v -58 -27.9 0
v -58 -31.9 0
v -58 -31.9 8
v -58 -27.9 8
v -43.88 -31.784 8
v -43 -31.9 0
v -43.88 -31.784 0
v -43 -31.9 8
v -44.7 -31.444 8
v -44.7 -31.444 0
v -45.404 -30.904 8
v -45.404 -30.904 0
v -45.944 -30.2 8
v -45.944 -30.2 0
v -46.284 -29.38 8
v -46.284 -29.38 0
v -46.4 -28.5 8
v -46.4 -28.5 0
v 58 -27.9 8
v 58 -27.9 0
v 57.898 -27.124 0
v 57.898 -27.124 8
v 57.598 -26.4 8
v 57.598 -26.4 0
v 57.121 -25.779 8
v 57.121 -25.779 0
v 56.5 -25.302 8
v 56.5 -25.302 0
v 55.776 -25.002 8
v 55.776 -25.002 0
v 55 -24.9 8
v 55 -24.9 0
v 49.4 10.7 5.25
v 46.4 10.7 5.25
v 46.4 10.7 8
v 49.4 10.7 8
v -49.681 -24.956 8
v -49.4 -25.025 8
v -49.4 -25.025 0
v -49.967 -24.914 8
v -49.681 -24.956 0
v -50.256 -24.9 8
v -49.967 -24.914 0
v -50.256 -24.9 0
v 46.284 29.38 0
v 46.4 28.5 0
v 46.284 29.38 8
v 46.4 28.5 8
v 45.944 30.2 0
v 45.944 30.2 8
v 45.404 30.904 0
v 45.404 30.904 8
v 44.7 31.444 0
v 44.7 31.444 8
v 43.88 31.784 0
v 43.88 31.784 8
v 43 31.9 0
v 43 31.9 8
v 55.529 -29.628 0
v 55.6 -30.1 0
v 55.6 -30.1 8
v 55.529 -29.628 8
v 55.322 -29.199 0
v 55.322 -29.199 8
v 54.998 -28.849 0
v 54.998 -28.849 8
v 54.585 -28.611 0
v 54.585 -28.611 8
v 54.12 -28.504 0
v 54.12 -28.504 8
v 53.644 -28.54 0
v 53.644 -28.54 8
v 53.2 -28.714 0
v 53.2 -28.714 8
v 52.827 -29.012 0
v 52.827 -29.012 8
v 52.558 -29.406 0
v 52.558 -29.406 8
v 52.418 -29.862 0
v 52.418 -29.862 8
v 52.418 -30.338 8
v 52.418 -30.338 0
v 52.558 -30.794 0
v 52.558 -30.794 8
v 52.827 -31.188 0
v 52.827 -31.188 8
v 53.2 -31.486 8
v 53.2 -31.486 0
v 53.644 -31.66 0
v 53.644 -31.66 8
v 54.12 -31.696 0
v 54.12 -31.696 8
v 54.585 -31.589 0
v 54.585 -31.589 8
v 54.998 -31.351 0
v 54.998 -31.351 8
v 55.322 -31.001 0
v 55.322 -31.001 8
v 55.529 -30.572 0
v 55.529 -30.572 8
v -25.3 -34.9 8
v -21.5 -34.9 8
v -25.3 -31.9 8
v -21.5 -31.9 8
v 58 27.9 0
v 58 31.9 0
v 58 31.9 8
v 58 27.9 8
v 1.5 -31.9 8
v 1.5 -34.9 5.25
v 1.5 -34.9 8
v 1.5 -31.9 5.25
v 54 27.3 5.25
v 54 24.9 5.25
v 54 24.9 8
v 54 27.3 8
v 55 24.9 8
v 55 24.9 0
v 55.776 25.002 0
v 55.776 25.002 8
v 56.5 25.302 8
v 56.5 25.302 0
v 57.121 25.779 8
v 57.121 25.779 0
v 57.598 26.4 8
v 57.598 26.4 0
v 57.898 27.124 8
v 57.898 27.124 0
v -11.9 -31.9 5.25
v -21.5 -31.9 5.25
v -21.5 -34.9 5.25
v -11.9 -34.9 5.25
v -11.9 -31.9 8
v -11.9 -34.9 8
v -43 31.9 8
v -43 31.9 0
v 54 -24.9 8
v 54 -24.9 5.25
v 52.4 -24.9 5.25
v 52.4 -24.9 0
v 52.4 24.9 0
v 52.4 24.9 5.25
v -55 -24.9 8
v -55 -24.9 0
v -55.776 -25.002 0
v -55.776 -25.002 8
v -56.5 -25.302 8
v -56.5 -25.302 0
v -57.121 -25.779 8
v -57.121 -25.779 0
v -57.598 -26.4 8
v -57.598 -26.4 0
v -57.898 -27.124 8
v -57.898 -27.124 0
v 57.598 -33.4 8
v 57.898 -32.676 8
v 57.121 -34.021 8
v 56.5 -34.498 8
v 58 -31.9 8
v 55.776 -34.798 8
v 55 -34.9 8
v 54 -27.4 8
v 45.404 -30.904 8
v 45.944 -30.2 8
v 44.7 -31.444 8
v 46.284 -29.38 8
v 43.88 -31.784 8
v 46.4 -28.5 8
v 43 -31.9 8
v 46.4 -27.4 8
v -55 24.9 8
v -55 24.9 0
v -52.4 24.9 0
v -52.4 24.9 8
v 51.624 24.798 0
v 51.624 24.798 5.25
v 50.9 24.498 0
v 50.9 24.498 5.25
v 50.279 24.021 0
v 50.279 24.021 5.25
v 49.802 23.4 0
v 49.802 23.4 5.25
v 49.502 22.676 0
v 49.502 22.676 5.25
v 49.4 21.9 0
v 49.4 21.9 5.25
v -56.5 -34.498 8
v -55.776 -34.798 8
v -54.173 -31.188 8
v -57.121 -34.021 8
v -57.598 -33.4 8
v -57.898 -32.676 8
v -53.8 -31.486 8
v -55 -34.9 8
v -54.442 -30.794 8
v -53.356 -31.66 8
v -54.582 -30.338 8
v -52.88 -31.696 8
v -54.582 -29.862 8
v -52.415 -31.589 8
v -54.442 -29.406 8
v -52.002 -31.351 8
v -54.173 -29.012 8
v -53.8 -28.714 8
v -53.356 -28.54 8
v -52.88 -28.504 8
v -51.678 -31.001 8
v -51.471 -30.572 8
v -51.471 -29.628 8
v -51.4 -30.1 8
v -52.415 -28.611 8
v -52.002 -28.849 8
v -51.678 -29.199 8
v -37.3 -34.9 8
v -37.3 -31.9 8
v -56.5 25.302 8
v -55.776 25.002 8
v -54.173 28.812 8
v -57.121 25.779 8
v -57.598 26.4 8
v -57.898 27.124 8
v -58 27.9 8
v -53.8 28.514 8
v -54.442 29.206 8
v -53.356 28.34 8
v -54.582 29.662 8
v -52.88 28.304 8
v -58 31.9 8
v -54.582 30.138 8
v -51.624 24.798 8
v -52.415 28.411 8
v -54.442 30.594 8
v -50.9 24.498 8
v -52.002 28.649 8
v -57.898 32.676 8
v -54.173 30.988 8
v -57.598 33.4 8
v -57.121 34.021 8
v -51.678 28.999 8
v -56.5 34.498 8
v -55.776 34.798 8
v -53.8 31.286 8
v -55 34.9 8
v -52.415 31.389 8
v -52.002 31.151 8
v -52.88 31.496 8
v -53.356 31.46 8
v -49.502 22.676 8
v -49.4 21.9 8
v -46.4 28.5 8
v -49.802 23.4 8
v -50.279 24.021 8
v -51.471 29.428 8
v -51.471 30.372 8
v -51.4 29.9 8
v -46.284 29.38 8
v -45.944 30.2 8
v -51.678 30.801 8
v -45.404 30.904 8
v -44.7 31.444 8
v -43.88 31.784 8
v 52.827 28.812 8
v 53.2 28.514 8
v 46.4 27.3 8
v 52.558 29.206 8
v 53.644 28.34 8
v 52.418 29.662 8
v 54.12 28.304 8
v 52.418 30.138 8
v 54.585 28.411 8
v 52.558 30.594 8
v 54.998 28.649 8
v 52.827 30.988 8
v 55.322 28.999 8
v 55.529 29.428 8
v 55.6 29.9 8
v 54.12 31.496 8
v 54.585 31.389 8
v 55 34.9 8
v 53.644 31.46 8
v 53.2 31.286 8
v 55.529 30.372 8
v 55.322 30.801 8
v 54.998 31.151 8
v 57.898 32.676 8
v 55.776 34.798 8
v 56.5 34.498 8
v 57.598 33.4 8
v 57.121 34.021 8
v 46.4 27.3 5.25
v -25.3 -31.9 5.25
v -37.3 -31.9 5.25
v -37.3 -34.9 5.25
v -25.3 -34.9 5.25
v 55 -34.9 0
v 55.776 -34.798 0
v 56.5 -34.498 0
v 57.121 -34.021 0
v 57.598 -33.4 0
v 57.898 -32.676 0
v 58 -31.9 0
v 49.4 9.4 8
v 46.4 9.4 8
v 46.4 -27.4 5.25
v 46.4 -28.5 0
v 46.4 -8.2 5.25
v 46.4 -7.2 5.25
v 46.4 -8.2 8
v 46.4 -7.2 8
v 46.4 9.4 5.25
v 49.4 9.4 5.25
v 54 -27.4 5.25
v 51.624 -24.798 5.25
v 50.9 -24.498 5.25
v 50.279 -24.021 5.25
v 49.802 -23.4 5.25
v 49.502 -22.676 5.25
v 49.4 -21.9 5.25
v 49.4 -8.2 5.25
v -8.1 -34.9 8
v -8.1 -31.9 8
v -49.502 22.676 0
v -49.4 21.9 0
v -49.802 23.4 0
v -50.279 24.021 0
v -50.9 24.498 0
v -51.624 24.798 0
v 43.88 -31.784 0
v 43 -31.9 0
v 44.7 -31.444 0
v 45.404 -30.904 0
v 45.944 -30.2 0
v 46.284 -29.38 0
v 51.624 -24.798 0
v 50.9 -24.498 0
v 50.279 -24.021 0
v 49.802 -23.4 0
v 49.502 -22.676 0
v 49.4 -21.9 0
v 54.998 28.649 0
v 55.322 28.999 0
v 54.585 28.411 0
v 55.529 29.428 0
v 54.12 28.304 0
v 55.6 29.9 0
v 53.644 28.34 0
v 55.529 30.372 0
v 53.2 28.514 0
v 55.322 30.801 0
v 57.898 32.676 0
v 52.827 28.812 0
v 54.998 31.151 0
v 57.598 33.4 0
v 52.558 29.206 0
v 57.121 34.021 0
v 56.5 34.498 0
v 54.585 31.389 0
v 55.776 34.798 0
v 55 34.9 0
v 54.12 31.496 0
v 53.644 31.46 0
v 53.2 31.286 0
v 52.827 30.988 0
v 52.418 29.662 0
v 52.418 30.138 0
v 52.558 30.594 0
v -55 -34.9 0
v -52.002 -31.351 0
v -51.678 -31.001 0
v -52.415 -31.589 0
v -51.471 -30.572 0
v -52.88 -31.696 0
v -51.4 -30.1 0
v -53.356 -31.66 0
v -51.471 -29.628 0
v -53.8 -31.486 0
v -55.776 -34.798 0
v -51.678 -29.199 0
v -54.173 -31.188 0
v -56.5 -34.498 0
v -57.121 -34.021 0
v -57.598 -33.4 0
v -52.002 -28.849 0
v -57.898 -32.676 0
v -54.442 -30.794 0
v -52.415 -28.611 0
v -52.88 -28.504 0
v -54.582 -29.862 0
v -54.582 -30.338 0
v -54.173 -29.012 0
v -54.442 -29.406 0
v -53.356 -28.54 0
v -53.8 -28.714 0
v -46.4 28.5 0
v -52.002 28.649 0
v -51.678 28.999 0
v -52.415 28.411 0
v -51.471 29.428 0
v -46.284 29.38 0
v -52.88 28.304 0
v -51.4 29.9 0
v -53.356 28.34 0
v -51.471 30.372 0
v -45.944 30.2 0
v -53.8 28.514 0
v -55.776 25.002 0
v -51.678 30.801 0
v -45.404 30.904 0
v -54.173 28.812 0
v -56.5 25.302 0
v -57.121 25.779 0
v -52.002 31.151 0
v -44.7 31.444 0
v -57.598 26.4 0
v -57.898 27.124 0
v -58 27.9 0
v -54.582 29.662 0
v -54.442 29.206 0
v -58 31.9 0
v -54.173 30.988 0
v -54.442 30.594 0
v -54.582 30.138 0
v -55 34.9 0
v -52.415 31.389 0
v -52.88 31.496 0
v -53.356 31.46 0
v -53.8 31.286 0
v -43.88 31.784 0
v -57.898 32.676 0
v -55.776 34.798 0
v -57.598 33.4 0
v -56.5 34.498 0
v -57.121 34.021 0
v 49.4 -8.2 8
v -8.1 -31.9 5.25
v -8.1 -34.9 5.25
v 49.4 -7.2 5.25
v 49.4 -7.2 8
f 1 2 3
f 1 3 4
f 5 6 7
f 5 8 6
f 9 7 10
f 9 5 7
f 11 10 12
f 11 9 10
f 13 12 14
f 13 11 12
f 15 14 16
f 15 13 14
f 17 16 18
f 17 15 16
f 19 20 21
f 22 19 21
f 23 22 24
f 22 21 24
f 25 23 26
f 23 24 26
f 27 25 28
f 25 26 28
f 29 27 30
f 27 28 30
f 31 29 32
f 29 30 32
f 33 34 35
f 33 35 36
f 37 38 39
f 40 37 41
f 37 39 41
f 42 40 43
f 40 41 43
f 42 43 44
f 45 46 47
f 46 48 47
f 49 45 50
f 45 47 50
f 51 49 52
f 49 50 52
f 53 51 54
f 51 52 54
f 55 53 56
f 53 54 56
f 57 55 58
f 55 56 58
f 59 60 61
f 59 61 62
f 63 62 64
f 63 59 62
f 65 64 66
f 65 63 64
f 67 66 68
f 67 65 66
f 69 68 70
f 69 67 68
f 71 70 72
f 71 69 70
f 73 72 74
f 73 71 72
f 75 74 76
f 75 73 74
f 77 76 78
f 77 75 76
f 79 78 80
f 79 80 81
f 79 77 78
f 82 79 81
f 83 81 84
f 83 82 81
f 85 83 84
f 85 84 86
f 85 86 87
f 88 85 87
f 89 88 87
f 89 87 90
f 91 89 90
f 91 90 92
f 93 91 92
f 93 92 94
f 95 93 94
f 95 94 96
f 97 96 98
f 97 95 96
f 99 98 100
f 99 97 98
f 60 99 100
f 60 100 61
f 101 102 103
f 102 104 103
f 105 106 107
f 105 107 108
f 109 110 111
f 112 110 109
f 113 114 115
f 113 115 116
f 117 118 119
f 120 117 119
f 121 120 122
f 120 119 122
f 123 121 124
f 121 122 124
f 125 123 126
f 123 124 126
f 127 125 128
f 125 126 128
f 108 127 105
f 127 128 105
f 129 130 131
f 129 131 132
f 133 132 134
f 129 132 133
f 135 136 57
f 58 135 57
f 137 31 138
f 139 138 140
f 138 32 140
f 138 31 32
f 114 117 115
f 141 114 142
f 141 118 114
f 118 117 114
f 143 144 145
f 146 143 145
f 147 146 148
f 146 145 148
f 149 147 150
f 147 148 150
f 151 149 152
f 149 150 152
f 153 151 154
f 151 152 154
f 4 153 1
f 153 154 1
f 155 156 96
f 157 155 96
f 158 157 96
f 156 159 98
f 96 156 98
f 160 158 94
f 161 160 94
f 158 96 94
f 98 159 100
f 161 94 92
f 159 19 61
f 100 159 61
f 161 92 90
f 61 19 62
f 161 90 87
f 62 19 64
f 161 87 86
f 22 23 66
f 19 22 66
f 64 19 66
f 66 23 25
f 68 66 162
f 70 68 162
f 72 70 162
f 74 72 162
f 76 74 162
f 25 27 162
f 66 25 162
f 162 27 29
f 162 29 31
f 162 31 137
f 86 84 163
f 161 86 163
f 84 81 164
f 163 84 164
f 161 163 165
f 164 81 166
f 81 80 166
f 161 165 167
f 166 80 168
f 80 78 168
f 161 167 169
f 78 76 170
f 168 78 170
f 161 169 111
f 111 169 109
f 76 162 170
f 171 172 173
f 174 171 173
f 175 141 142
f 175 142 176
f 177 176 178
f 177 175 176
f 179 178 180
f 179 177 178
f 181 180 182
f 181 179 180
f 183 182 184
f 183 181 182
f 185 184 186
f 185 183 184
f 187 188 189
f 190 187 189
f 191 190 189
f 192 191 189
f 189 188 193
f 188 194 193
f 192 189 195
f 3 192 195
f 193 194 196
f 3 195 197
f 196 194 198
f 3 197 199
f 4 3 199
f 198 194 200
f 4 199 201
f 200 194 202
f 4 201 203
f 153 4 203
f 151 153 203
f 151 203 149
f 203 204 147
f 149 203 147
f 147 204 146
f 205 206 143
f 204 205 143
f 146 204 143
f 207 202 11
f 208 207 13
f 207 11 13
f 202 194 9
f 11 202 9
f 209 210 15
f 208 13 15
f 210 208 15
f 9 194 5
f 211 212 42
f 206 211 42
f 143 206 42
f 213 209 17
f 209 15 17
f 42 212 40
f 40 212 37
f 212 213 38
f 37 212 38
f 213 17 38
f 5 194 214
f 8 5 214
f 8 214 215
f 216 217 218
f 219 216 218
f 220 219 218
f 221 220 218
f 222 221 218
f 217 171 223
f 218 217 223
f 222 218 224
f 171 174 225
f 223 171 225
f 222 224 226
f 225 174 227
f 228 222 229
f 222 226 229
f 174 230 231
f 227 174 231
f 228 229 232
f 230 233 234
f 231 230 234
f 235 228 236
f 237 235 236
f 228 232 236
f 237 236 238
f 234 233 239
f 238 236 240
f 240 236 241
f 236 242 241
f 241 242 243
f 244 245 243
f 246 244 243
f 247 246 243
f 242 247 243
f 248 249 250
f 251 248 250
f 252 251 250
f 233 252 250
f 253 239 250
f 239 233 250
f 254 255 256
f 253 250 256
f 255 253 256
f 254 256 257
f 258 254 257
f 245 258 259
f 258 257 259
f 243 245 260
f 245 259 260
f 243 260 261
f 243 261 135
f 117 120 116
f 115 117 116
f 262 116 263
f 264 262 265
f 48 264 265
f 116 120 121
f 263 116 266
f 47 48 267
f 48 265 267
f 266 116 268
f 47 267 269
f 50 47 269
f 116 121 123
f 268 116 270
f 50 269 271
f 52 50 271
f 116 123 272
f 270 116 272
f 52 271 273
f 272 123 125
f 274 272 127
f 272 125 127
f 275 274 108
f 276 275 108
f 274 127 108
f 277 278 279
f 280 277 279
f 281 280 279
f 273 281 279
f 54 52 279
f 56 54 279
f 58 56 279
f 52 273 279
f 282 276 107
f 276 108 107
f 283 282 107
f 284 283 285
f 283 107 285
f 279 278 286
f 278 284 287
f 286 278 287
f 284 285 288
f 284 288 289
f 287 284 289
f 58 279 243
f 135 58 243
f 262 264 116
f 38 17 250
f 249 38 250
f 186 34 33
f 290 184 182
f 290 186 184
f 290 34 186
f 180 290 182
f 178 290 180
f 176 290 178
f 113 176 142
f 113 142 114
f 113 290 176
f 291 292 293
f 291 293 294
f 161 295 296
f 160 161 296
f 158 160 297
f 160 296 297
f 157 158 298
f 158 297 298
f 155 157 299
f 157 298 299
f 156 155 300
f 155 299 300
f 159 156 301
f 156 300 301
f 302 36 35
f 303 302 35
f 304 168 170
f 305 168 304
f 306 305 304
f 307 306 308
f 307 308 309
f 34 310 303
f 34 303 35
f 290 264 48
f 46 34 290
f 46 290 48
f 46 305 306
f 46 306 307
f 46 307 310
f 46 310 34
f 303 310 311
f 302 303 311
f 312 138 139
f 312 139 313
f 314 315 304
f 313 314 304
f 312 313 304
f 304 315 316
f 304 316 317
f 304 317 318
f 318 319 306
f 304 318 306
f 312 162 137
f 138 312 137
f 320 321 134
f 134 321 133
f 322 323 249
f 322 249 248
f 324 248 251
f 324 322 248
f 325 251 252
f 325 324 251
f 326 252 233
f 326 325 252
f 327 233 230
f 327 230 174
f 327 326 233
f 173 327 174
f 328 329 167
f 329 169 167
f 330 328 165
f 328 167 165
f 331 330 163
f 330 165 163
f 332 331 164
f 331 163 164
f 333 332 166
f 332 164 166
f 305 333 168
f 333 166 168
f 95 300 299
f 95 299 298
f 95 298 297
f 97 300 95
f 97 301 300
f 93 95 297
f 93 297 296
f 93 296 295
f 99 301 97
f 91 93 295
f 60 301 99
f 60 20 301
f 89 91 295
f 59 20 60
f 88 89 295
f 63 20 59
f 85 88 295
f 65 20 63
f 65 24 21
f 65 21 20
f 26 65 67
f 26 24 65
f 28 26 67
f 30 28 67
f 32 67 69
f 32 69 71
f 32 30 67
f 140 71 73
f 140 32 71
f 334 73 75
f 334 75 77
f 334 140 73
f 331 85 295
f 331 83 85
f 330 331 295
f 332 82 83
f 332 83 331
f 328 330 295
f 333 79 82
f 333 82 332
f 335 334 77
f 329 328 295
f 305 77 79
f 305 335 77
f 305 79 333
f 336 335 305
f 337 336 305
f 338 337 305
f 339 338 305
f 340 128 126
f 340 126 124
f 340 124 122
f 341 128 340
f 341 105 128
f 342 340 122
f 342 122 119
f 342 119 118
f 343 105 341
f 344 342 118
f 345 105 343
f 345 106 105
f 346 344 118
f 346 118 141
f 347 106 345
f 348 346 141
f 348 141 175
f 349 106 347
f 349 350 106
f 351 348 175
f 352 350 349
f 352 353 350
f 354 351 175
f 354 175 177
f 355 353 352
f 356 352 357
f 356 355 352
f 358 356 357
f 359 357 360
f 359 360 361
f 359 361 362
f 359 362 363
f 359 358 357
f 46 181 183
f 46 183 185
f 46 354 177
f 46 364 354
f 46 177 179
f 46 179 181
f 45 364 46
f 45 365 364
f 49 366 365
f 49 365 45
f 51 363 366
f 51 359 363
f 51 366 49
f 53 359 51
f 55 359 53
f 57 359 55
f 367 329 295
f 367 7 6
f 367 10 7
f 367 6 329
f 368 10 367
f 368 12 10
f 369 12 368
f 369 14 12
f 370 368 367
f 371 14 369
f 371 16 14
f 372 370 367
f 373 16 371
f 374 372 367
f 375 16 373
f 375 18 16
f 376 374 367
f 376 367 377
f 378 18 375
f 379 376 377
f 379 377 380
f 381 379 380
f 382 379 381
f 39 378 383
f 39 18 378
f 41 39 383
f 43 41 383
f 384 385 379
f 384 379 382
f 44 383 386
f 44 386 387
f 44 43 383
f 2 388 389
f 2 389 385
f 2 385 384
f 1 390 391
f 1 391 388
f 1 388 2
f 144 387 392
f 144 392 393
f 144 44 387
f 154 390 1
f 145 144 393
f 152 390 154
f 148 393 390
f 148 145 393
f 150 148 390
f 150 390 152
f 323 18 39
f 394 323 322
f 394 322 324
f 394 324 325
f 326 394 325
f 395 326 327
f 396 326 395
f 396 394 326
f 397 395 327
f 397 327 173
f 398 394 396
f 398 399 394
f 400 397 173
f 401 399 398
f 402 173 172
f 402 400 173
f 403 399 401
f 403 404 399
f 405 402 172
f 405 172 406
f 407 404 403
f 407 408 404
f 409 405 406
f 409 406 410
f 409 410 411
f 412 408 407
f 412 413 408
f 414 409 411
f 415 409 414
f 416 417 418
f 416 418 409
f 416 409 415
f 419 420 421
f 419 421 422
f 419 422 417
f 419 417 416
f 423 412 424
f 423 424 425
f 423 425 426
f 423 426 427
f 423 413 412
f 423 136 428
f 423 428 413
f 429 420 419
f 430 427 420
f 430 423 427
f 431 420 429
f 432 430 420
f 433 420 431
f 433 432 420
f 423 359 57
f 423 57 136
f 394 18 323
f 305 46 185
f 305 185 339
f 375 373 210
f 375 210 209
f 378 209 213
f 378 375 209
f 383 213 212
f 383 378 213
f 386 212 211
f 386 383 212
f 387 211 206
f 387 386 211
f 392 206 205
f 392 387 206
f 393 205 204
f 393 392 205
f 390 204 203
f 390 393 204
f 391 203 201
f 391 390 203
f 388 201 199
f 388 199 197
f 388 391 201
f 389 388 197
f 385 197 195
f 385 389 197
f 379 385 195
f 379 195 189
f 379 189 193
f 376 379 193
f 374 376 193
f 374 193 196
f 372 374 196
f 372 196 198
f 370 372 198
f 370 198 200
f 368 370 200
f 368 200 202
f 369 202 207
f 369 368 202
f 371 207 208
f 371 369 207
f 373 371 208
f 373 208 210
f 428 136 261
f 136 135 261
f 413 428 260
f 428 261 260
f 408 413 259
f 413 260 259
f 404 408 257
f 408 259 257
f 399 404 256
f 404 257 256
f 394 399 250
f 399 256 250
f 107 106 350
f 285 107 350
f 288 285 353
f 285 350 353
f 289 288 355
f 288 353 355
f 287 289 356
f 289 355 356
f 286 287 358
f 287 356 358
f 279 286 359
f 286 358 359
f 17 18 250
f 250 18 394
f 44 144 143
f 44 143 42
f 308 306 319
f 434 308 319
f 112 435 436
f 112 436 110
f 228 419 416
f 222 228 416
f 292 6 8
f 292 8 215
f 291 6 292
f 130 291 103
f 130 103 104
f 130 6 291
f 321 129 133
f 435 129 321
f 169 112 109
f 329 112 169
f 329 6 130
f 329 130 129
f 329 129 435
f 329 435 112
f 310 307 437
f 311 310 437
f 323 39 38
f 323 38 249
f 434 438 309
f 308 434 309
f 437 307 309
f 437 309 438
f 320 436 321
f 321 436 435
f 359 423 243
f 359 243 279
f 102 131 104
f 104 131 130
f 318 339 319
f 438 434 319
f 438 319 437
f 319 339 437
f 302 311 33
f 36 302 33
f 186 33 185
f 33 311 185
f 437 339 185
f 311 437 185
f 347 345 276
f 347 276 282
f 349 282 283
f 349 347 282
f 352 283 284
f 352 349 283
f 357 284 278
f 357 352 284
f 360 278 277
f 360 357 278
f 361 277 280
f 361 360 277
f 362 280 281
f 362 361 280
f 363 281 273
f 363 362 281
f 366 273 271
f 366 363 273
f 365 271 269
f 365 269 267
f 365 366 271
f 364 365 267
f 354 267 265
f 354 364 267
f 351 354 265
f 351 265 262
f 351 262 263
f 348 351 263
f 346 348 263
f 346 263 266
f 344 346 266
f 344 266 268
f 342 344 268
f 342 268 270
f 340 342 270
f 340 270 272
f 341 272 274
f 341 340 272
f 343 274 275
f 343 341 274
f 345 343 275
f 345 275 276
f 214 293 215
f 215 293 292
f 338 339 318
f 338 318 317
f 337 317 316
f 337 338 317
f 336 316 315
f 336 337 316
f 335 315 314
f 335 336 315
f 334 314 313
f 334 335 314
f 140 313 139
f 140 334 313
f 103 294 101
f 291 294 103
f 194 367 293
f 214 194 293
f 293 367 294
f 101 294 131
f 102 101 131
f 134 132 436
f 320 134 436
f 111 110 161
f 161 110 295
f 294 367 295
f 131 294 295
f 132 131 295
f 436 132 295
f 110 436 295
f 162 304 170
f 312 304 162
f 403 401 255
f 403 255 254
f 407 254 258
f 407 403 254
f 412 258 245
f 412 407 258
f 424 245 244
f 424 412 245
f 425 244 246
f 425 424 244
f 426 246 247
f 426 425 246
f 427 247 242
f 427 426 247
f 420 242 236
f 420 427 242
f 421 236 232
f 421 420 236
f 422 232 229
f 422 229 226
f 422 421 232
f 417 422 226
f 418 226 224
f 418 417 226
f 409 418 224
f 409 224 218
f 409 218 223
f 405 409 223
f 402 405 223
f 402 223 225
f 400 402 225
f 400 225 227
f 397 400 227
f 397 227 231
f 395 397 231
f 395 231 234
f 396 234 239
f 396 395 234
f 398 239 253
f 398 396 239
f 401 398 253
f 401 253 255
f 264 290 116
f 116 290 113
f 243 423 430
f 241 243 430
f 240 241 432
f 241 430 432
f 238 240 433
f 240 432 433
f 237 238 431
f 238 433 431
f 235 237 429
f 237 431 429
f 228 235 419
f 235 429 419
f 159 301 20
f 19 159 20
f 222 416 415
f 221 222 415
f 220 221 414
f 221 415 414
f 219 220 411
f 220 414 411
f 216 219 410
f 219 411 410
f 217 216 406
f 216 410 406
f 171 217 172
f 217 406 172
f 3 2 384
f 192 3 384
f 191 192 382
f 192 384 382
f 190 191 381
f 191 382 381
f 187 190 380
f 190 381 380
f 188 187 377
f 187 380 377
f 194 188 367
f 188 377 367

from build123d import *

# Parameters (mm, degrees)
FRAMEOUTSIDE_W                    = 98.8
FRAMEOUTSIDE_H                    = 69.8
FRAME_HEIGHT_8_DEPTH              = 8
OUTSIDE_R6P4_R                    = 6.4
FRAMEINSIDE_W                     = 92.8
FRAMEINSIDE_H                     = 63.8
OPEN_THROUGH_FRAME_DEPTH          = 8.3
INSIDE_R3P4_R                     = 3.4
FOUR_CORNER_EARS_R2_PITCH110X80_R = 1.6
INTEGRAL_EARS_4X3P2_DEPTH         = 8
OPEN_TOP_CABLE_RELIEFS_START      = 5.25
PLUG_CLEARANCE_PROFILES_W         = 12
PLUG_CLEARANCE_PROFILES_H         = 8
PLUG_CLEARANCE_PROFILES_W_2       = 9.6
PLUG_CLEARANCE_PROFILES_W_3       = 8.5
PLUG_CLEARANCE_PROFILES_H_2       = 19.2
PLUG_CLEARANCE_PROFILES_H_3       = 16.6
OPEN_TOP_CABLE_RELIEFS_DEPTH      = 3.25
FILLET_1_R                        = 3


with BuildPart() as part:
    # FrameOutside → Frame_Height_8 (new body)
    with BuildSketch(Plane.XY):
        Rectangle(FRAMEOUTSIDE_W, FRAMEOUTSIDE_H)
    extrude(amount=FRAME_HEIGHT_8_DEPTH)

    # Outside_R6p4
    outside_r6p4_edges = [part.edges().sort_by_distance(p)[0] for p in [
        (49.4, -34.9, 4),
        (-49.4, -34.9, 4),
        (-49.4, 34.9, 4),
        (49.4, 34.9, 4),
    ]]
    fillet(outside_r6p4_edges, radius=OUTSIDE_R6P4_R)

    # FrameInside → Open_Through_Frame (cut)
    with BuildSketch(Plane.XY):
        Rectangle(FRAMEINSIDE_W, FRAMEINSIDE_H)
    extrude(amount=OPEN_THROUGH_FRAME_DEPTH, mode=Mode.SUBTRACT)

    # Inside_R3p4
    inside_r3p4_edges = [part.edges().sort_by_distance(p)[0] for p in [
        (46.4, -31.9, 4),
        (46.4, 31.9, 4),
        (-46.4, 31.9, 4),
        (-46.4, -31.9, 4),
    ]]
    fillet(inside_r3p4_edges, radius=INSIDE_R3P4_R)

    # Four_Corner_Ears_R2_Pitch110x80 → Integral_Ears_4x3p2 (add)
    # profile 1 of 4: a face of its own
    with BuildSketch(Plane.XY):
        Polygon((43, 34.9), (58, 34.9), (58, 24.9), (49.4, 24.9), align=None)
        with Locations((54, 29.9)):
            Circle(FOUR_CORNER_EARS_R2_PITCH110X80_R, mode=Mode.SUBTRACT)
    # profile 2 of 4: a face of its own
    with BuildSketch(Plane.XY):
        Polygon((43, -34.9), (58, -34.9), (58, -24.9), (49.4, -24.9), align=None)
        with Locations((54, -30.1)):
            Circle(FOUR_CORNER_EARS_R2_PITCH110X80_R, mode=Mode.SUBTRACT)
    # profile 3 of 4: a face of its own
    with BuildSketch(Plane.XY):
        Polygon((-43, -34.9), (-58, -34.9), (-58, -24.9), (-49.480769769, -24.9), align=None)
        with Locations((-53, -30.1)):
            Circle(FOUR_CORNER_EARS_R2_PITCH110X80_R, mode=Mode.SUBTRACT)
    # profile 4 of 4: a face of its own
    with BuildSketch(Plane.XY):
        Polygon((-43, 34.9), (-58, 34.9), (-58, 24.9), (-49.4, 24.9), align=None)
        with Locations((-53, 29.9)):
            Circle(FOUR_CORNER_EARS_R2_PITCH110X80_R, mode=Mode.SUBTRACT)
    extrude(amount=INTEGRAL_EARS_4X3P2_DEPTH)

    # Plug_Clearance_Profiles → Open_Top_Cable_Reliefs (cut)
    with BuildSketch(Plane.XY.offset(OPEN_TOP_CABLE_RELIEFS_START)):
        with Locations((-31.3, -35)):
            Rectangle(PLUG_CLEARANCE_PROFILES_W, PLUG_CLEARANCE_PROFILES_H)
        with Locations((-16.7, -35)):
            Rectangle(PLUG_CLEARANCE_PROFILES_W_2, PLUG_CLEARANCE_PROFILES_H)
        with Locations((-3.3, -35)):
            Rectangle(PLUG_CLEARANCE_PROFILES_W_2, PLUG_CLEARANCE_PROFILES_H)
        with Locations((49.75, -17.8)):
            Rectangle(PLUG_CLEARANCE_PROFILES_W_3, PLUG_CLEARANCE_PROFILES_H_2)
        with Locations((49.75, 1.1)):
            Rectangle(PLUG_CLEARANCE_PROFILES_W_3, PLUG_CLEARANCE_PROFILES_H_3)
        with Locations((49.75, 19)):
            Rectangle(PLUG_CLEARANCE_PROFILES_W_3, PLUG_CLEARANCE_PROFILES_H_3)
    extrude(amount=OPEN_TOP_CABLE_RELIEFS_DEPTH, mode=Mode.SUBTRACT)

    # 圆角1
    # the kernel refuses this fillet: 3 mm, written as the material it adds along each edge
    with BuildSketch(Plane(origin=(-49.4, 24.9, 0), x_dir=(0, -1, 0), z_dir=(0, 0, 1))) as fillet_1_piece_1:
        with BuildLine():
            CenterArc((FILLET_1_R, -FILLET_1_R), FILLET_1_R, 90, 90)
            Line((0, -FILLET_1_R), (0, 0))
            Line((0, 0), (FILLET_1_R, 0))
        make_face()
    extrude(amount=8)
    with BuildSketch(Plane(origin=(49.4, -24.9, 0), x_dir=(1, 0, 0), z_dir=(0, 0, 1)), Plane(origin=(49.4, 24.9, 0), x_dir=(0, -1, 0), z_dir=(0, 0, 1))) as fillet_1_piece_2:
        with BuildLine():
            CenterArc((FILLET_1_R, FILLET_1_R), FILLET_1_R, 180, 90)
            Line((0, FILLET_1_R), (0, 0))
            Line((0, 0), (FILLET_1_R, 0))
        make_face()
    extrude(amount=5.25)
    # the kernel refuses this fillet: 3 mm, written as the material it takes off along each edge
    with BuildSketch(Plane(origin=(-58, 34.9, -7.5), x_dir=(1, 0, 0), z_dir=(0, 0, 1)), Plane(origin=(-58, 24.9, -7.5), x_dir=(0, 1, 0), z_dir=(0, 0, 1)), Plane(origin=(-58, -24.9, -7.5), x_dir=(1, 0, 0), z_dir=(0, 0, 1)), Plane(origin=(-58, -34.9, -7.5), x_dir=(0, 1, 0), z_dir=(0, 0, 1)), Plane(origin=(58, -24.9, -7.5), x_dir=(0, -1, 0), z_dir=(0, 0, 1)), Plane(origin=(58, -34.9, -7.5), x_dir=(-1, 0, 0), z_dir=(0, 0, 1)), Plane(origin=(58, 24.9, -7.5), x_dir=(-1, 0, 0), z_dir=(0, 0, 1)), Plane(origin=(58, 34.9, -7.5), x_dir=(0, -1, 0), z_dir=(0, 0, 1))) as fillet_1_2_piece_1:
        with BuildLine():
            CenterArc((FILLET_1_R, -FILLET_1_R), FILLET_1_R, 90, 90)
            Line((0, -FILLET_1_R), (0, 0))
            Line((0, 0), (FILLET_1_R, 0))
        make_face()
    extrude(amount=23, mode=Mode.SUBTRACT)
    with BuildSketch(Plane(origin=(-49.480769769, -24.9, -1.937361077), x_dir=(0.5438533962151781, -0.8391802448968972, 0), z_dir=(0, 0, 1))) as fillet_1_2_piece_2:
        with BuildLine():
            CenterArc((2.096084574, -2.281878246), FILLET_1_R, 130.480576978, 16.573079502)
            Line((-0.421456161, -0.650318057), (0, 0))
            Line((0, 0), (0.148513864, 0))
        make_face()
    extrude(amount=11.874722155, mode=Mode.SUBTRACT)


solid = part.part
